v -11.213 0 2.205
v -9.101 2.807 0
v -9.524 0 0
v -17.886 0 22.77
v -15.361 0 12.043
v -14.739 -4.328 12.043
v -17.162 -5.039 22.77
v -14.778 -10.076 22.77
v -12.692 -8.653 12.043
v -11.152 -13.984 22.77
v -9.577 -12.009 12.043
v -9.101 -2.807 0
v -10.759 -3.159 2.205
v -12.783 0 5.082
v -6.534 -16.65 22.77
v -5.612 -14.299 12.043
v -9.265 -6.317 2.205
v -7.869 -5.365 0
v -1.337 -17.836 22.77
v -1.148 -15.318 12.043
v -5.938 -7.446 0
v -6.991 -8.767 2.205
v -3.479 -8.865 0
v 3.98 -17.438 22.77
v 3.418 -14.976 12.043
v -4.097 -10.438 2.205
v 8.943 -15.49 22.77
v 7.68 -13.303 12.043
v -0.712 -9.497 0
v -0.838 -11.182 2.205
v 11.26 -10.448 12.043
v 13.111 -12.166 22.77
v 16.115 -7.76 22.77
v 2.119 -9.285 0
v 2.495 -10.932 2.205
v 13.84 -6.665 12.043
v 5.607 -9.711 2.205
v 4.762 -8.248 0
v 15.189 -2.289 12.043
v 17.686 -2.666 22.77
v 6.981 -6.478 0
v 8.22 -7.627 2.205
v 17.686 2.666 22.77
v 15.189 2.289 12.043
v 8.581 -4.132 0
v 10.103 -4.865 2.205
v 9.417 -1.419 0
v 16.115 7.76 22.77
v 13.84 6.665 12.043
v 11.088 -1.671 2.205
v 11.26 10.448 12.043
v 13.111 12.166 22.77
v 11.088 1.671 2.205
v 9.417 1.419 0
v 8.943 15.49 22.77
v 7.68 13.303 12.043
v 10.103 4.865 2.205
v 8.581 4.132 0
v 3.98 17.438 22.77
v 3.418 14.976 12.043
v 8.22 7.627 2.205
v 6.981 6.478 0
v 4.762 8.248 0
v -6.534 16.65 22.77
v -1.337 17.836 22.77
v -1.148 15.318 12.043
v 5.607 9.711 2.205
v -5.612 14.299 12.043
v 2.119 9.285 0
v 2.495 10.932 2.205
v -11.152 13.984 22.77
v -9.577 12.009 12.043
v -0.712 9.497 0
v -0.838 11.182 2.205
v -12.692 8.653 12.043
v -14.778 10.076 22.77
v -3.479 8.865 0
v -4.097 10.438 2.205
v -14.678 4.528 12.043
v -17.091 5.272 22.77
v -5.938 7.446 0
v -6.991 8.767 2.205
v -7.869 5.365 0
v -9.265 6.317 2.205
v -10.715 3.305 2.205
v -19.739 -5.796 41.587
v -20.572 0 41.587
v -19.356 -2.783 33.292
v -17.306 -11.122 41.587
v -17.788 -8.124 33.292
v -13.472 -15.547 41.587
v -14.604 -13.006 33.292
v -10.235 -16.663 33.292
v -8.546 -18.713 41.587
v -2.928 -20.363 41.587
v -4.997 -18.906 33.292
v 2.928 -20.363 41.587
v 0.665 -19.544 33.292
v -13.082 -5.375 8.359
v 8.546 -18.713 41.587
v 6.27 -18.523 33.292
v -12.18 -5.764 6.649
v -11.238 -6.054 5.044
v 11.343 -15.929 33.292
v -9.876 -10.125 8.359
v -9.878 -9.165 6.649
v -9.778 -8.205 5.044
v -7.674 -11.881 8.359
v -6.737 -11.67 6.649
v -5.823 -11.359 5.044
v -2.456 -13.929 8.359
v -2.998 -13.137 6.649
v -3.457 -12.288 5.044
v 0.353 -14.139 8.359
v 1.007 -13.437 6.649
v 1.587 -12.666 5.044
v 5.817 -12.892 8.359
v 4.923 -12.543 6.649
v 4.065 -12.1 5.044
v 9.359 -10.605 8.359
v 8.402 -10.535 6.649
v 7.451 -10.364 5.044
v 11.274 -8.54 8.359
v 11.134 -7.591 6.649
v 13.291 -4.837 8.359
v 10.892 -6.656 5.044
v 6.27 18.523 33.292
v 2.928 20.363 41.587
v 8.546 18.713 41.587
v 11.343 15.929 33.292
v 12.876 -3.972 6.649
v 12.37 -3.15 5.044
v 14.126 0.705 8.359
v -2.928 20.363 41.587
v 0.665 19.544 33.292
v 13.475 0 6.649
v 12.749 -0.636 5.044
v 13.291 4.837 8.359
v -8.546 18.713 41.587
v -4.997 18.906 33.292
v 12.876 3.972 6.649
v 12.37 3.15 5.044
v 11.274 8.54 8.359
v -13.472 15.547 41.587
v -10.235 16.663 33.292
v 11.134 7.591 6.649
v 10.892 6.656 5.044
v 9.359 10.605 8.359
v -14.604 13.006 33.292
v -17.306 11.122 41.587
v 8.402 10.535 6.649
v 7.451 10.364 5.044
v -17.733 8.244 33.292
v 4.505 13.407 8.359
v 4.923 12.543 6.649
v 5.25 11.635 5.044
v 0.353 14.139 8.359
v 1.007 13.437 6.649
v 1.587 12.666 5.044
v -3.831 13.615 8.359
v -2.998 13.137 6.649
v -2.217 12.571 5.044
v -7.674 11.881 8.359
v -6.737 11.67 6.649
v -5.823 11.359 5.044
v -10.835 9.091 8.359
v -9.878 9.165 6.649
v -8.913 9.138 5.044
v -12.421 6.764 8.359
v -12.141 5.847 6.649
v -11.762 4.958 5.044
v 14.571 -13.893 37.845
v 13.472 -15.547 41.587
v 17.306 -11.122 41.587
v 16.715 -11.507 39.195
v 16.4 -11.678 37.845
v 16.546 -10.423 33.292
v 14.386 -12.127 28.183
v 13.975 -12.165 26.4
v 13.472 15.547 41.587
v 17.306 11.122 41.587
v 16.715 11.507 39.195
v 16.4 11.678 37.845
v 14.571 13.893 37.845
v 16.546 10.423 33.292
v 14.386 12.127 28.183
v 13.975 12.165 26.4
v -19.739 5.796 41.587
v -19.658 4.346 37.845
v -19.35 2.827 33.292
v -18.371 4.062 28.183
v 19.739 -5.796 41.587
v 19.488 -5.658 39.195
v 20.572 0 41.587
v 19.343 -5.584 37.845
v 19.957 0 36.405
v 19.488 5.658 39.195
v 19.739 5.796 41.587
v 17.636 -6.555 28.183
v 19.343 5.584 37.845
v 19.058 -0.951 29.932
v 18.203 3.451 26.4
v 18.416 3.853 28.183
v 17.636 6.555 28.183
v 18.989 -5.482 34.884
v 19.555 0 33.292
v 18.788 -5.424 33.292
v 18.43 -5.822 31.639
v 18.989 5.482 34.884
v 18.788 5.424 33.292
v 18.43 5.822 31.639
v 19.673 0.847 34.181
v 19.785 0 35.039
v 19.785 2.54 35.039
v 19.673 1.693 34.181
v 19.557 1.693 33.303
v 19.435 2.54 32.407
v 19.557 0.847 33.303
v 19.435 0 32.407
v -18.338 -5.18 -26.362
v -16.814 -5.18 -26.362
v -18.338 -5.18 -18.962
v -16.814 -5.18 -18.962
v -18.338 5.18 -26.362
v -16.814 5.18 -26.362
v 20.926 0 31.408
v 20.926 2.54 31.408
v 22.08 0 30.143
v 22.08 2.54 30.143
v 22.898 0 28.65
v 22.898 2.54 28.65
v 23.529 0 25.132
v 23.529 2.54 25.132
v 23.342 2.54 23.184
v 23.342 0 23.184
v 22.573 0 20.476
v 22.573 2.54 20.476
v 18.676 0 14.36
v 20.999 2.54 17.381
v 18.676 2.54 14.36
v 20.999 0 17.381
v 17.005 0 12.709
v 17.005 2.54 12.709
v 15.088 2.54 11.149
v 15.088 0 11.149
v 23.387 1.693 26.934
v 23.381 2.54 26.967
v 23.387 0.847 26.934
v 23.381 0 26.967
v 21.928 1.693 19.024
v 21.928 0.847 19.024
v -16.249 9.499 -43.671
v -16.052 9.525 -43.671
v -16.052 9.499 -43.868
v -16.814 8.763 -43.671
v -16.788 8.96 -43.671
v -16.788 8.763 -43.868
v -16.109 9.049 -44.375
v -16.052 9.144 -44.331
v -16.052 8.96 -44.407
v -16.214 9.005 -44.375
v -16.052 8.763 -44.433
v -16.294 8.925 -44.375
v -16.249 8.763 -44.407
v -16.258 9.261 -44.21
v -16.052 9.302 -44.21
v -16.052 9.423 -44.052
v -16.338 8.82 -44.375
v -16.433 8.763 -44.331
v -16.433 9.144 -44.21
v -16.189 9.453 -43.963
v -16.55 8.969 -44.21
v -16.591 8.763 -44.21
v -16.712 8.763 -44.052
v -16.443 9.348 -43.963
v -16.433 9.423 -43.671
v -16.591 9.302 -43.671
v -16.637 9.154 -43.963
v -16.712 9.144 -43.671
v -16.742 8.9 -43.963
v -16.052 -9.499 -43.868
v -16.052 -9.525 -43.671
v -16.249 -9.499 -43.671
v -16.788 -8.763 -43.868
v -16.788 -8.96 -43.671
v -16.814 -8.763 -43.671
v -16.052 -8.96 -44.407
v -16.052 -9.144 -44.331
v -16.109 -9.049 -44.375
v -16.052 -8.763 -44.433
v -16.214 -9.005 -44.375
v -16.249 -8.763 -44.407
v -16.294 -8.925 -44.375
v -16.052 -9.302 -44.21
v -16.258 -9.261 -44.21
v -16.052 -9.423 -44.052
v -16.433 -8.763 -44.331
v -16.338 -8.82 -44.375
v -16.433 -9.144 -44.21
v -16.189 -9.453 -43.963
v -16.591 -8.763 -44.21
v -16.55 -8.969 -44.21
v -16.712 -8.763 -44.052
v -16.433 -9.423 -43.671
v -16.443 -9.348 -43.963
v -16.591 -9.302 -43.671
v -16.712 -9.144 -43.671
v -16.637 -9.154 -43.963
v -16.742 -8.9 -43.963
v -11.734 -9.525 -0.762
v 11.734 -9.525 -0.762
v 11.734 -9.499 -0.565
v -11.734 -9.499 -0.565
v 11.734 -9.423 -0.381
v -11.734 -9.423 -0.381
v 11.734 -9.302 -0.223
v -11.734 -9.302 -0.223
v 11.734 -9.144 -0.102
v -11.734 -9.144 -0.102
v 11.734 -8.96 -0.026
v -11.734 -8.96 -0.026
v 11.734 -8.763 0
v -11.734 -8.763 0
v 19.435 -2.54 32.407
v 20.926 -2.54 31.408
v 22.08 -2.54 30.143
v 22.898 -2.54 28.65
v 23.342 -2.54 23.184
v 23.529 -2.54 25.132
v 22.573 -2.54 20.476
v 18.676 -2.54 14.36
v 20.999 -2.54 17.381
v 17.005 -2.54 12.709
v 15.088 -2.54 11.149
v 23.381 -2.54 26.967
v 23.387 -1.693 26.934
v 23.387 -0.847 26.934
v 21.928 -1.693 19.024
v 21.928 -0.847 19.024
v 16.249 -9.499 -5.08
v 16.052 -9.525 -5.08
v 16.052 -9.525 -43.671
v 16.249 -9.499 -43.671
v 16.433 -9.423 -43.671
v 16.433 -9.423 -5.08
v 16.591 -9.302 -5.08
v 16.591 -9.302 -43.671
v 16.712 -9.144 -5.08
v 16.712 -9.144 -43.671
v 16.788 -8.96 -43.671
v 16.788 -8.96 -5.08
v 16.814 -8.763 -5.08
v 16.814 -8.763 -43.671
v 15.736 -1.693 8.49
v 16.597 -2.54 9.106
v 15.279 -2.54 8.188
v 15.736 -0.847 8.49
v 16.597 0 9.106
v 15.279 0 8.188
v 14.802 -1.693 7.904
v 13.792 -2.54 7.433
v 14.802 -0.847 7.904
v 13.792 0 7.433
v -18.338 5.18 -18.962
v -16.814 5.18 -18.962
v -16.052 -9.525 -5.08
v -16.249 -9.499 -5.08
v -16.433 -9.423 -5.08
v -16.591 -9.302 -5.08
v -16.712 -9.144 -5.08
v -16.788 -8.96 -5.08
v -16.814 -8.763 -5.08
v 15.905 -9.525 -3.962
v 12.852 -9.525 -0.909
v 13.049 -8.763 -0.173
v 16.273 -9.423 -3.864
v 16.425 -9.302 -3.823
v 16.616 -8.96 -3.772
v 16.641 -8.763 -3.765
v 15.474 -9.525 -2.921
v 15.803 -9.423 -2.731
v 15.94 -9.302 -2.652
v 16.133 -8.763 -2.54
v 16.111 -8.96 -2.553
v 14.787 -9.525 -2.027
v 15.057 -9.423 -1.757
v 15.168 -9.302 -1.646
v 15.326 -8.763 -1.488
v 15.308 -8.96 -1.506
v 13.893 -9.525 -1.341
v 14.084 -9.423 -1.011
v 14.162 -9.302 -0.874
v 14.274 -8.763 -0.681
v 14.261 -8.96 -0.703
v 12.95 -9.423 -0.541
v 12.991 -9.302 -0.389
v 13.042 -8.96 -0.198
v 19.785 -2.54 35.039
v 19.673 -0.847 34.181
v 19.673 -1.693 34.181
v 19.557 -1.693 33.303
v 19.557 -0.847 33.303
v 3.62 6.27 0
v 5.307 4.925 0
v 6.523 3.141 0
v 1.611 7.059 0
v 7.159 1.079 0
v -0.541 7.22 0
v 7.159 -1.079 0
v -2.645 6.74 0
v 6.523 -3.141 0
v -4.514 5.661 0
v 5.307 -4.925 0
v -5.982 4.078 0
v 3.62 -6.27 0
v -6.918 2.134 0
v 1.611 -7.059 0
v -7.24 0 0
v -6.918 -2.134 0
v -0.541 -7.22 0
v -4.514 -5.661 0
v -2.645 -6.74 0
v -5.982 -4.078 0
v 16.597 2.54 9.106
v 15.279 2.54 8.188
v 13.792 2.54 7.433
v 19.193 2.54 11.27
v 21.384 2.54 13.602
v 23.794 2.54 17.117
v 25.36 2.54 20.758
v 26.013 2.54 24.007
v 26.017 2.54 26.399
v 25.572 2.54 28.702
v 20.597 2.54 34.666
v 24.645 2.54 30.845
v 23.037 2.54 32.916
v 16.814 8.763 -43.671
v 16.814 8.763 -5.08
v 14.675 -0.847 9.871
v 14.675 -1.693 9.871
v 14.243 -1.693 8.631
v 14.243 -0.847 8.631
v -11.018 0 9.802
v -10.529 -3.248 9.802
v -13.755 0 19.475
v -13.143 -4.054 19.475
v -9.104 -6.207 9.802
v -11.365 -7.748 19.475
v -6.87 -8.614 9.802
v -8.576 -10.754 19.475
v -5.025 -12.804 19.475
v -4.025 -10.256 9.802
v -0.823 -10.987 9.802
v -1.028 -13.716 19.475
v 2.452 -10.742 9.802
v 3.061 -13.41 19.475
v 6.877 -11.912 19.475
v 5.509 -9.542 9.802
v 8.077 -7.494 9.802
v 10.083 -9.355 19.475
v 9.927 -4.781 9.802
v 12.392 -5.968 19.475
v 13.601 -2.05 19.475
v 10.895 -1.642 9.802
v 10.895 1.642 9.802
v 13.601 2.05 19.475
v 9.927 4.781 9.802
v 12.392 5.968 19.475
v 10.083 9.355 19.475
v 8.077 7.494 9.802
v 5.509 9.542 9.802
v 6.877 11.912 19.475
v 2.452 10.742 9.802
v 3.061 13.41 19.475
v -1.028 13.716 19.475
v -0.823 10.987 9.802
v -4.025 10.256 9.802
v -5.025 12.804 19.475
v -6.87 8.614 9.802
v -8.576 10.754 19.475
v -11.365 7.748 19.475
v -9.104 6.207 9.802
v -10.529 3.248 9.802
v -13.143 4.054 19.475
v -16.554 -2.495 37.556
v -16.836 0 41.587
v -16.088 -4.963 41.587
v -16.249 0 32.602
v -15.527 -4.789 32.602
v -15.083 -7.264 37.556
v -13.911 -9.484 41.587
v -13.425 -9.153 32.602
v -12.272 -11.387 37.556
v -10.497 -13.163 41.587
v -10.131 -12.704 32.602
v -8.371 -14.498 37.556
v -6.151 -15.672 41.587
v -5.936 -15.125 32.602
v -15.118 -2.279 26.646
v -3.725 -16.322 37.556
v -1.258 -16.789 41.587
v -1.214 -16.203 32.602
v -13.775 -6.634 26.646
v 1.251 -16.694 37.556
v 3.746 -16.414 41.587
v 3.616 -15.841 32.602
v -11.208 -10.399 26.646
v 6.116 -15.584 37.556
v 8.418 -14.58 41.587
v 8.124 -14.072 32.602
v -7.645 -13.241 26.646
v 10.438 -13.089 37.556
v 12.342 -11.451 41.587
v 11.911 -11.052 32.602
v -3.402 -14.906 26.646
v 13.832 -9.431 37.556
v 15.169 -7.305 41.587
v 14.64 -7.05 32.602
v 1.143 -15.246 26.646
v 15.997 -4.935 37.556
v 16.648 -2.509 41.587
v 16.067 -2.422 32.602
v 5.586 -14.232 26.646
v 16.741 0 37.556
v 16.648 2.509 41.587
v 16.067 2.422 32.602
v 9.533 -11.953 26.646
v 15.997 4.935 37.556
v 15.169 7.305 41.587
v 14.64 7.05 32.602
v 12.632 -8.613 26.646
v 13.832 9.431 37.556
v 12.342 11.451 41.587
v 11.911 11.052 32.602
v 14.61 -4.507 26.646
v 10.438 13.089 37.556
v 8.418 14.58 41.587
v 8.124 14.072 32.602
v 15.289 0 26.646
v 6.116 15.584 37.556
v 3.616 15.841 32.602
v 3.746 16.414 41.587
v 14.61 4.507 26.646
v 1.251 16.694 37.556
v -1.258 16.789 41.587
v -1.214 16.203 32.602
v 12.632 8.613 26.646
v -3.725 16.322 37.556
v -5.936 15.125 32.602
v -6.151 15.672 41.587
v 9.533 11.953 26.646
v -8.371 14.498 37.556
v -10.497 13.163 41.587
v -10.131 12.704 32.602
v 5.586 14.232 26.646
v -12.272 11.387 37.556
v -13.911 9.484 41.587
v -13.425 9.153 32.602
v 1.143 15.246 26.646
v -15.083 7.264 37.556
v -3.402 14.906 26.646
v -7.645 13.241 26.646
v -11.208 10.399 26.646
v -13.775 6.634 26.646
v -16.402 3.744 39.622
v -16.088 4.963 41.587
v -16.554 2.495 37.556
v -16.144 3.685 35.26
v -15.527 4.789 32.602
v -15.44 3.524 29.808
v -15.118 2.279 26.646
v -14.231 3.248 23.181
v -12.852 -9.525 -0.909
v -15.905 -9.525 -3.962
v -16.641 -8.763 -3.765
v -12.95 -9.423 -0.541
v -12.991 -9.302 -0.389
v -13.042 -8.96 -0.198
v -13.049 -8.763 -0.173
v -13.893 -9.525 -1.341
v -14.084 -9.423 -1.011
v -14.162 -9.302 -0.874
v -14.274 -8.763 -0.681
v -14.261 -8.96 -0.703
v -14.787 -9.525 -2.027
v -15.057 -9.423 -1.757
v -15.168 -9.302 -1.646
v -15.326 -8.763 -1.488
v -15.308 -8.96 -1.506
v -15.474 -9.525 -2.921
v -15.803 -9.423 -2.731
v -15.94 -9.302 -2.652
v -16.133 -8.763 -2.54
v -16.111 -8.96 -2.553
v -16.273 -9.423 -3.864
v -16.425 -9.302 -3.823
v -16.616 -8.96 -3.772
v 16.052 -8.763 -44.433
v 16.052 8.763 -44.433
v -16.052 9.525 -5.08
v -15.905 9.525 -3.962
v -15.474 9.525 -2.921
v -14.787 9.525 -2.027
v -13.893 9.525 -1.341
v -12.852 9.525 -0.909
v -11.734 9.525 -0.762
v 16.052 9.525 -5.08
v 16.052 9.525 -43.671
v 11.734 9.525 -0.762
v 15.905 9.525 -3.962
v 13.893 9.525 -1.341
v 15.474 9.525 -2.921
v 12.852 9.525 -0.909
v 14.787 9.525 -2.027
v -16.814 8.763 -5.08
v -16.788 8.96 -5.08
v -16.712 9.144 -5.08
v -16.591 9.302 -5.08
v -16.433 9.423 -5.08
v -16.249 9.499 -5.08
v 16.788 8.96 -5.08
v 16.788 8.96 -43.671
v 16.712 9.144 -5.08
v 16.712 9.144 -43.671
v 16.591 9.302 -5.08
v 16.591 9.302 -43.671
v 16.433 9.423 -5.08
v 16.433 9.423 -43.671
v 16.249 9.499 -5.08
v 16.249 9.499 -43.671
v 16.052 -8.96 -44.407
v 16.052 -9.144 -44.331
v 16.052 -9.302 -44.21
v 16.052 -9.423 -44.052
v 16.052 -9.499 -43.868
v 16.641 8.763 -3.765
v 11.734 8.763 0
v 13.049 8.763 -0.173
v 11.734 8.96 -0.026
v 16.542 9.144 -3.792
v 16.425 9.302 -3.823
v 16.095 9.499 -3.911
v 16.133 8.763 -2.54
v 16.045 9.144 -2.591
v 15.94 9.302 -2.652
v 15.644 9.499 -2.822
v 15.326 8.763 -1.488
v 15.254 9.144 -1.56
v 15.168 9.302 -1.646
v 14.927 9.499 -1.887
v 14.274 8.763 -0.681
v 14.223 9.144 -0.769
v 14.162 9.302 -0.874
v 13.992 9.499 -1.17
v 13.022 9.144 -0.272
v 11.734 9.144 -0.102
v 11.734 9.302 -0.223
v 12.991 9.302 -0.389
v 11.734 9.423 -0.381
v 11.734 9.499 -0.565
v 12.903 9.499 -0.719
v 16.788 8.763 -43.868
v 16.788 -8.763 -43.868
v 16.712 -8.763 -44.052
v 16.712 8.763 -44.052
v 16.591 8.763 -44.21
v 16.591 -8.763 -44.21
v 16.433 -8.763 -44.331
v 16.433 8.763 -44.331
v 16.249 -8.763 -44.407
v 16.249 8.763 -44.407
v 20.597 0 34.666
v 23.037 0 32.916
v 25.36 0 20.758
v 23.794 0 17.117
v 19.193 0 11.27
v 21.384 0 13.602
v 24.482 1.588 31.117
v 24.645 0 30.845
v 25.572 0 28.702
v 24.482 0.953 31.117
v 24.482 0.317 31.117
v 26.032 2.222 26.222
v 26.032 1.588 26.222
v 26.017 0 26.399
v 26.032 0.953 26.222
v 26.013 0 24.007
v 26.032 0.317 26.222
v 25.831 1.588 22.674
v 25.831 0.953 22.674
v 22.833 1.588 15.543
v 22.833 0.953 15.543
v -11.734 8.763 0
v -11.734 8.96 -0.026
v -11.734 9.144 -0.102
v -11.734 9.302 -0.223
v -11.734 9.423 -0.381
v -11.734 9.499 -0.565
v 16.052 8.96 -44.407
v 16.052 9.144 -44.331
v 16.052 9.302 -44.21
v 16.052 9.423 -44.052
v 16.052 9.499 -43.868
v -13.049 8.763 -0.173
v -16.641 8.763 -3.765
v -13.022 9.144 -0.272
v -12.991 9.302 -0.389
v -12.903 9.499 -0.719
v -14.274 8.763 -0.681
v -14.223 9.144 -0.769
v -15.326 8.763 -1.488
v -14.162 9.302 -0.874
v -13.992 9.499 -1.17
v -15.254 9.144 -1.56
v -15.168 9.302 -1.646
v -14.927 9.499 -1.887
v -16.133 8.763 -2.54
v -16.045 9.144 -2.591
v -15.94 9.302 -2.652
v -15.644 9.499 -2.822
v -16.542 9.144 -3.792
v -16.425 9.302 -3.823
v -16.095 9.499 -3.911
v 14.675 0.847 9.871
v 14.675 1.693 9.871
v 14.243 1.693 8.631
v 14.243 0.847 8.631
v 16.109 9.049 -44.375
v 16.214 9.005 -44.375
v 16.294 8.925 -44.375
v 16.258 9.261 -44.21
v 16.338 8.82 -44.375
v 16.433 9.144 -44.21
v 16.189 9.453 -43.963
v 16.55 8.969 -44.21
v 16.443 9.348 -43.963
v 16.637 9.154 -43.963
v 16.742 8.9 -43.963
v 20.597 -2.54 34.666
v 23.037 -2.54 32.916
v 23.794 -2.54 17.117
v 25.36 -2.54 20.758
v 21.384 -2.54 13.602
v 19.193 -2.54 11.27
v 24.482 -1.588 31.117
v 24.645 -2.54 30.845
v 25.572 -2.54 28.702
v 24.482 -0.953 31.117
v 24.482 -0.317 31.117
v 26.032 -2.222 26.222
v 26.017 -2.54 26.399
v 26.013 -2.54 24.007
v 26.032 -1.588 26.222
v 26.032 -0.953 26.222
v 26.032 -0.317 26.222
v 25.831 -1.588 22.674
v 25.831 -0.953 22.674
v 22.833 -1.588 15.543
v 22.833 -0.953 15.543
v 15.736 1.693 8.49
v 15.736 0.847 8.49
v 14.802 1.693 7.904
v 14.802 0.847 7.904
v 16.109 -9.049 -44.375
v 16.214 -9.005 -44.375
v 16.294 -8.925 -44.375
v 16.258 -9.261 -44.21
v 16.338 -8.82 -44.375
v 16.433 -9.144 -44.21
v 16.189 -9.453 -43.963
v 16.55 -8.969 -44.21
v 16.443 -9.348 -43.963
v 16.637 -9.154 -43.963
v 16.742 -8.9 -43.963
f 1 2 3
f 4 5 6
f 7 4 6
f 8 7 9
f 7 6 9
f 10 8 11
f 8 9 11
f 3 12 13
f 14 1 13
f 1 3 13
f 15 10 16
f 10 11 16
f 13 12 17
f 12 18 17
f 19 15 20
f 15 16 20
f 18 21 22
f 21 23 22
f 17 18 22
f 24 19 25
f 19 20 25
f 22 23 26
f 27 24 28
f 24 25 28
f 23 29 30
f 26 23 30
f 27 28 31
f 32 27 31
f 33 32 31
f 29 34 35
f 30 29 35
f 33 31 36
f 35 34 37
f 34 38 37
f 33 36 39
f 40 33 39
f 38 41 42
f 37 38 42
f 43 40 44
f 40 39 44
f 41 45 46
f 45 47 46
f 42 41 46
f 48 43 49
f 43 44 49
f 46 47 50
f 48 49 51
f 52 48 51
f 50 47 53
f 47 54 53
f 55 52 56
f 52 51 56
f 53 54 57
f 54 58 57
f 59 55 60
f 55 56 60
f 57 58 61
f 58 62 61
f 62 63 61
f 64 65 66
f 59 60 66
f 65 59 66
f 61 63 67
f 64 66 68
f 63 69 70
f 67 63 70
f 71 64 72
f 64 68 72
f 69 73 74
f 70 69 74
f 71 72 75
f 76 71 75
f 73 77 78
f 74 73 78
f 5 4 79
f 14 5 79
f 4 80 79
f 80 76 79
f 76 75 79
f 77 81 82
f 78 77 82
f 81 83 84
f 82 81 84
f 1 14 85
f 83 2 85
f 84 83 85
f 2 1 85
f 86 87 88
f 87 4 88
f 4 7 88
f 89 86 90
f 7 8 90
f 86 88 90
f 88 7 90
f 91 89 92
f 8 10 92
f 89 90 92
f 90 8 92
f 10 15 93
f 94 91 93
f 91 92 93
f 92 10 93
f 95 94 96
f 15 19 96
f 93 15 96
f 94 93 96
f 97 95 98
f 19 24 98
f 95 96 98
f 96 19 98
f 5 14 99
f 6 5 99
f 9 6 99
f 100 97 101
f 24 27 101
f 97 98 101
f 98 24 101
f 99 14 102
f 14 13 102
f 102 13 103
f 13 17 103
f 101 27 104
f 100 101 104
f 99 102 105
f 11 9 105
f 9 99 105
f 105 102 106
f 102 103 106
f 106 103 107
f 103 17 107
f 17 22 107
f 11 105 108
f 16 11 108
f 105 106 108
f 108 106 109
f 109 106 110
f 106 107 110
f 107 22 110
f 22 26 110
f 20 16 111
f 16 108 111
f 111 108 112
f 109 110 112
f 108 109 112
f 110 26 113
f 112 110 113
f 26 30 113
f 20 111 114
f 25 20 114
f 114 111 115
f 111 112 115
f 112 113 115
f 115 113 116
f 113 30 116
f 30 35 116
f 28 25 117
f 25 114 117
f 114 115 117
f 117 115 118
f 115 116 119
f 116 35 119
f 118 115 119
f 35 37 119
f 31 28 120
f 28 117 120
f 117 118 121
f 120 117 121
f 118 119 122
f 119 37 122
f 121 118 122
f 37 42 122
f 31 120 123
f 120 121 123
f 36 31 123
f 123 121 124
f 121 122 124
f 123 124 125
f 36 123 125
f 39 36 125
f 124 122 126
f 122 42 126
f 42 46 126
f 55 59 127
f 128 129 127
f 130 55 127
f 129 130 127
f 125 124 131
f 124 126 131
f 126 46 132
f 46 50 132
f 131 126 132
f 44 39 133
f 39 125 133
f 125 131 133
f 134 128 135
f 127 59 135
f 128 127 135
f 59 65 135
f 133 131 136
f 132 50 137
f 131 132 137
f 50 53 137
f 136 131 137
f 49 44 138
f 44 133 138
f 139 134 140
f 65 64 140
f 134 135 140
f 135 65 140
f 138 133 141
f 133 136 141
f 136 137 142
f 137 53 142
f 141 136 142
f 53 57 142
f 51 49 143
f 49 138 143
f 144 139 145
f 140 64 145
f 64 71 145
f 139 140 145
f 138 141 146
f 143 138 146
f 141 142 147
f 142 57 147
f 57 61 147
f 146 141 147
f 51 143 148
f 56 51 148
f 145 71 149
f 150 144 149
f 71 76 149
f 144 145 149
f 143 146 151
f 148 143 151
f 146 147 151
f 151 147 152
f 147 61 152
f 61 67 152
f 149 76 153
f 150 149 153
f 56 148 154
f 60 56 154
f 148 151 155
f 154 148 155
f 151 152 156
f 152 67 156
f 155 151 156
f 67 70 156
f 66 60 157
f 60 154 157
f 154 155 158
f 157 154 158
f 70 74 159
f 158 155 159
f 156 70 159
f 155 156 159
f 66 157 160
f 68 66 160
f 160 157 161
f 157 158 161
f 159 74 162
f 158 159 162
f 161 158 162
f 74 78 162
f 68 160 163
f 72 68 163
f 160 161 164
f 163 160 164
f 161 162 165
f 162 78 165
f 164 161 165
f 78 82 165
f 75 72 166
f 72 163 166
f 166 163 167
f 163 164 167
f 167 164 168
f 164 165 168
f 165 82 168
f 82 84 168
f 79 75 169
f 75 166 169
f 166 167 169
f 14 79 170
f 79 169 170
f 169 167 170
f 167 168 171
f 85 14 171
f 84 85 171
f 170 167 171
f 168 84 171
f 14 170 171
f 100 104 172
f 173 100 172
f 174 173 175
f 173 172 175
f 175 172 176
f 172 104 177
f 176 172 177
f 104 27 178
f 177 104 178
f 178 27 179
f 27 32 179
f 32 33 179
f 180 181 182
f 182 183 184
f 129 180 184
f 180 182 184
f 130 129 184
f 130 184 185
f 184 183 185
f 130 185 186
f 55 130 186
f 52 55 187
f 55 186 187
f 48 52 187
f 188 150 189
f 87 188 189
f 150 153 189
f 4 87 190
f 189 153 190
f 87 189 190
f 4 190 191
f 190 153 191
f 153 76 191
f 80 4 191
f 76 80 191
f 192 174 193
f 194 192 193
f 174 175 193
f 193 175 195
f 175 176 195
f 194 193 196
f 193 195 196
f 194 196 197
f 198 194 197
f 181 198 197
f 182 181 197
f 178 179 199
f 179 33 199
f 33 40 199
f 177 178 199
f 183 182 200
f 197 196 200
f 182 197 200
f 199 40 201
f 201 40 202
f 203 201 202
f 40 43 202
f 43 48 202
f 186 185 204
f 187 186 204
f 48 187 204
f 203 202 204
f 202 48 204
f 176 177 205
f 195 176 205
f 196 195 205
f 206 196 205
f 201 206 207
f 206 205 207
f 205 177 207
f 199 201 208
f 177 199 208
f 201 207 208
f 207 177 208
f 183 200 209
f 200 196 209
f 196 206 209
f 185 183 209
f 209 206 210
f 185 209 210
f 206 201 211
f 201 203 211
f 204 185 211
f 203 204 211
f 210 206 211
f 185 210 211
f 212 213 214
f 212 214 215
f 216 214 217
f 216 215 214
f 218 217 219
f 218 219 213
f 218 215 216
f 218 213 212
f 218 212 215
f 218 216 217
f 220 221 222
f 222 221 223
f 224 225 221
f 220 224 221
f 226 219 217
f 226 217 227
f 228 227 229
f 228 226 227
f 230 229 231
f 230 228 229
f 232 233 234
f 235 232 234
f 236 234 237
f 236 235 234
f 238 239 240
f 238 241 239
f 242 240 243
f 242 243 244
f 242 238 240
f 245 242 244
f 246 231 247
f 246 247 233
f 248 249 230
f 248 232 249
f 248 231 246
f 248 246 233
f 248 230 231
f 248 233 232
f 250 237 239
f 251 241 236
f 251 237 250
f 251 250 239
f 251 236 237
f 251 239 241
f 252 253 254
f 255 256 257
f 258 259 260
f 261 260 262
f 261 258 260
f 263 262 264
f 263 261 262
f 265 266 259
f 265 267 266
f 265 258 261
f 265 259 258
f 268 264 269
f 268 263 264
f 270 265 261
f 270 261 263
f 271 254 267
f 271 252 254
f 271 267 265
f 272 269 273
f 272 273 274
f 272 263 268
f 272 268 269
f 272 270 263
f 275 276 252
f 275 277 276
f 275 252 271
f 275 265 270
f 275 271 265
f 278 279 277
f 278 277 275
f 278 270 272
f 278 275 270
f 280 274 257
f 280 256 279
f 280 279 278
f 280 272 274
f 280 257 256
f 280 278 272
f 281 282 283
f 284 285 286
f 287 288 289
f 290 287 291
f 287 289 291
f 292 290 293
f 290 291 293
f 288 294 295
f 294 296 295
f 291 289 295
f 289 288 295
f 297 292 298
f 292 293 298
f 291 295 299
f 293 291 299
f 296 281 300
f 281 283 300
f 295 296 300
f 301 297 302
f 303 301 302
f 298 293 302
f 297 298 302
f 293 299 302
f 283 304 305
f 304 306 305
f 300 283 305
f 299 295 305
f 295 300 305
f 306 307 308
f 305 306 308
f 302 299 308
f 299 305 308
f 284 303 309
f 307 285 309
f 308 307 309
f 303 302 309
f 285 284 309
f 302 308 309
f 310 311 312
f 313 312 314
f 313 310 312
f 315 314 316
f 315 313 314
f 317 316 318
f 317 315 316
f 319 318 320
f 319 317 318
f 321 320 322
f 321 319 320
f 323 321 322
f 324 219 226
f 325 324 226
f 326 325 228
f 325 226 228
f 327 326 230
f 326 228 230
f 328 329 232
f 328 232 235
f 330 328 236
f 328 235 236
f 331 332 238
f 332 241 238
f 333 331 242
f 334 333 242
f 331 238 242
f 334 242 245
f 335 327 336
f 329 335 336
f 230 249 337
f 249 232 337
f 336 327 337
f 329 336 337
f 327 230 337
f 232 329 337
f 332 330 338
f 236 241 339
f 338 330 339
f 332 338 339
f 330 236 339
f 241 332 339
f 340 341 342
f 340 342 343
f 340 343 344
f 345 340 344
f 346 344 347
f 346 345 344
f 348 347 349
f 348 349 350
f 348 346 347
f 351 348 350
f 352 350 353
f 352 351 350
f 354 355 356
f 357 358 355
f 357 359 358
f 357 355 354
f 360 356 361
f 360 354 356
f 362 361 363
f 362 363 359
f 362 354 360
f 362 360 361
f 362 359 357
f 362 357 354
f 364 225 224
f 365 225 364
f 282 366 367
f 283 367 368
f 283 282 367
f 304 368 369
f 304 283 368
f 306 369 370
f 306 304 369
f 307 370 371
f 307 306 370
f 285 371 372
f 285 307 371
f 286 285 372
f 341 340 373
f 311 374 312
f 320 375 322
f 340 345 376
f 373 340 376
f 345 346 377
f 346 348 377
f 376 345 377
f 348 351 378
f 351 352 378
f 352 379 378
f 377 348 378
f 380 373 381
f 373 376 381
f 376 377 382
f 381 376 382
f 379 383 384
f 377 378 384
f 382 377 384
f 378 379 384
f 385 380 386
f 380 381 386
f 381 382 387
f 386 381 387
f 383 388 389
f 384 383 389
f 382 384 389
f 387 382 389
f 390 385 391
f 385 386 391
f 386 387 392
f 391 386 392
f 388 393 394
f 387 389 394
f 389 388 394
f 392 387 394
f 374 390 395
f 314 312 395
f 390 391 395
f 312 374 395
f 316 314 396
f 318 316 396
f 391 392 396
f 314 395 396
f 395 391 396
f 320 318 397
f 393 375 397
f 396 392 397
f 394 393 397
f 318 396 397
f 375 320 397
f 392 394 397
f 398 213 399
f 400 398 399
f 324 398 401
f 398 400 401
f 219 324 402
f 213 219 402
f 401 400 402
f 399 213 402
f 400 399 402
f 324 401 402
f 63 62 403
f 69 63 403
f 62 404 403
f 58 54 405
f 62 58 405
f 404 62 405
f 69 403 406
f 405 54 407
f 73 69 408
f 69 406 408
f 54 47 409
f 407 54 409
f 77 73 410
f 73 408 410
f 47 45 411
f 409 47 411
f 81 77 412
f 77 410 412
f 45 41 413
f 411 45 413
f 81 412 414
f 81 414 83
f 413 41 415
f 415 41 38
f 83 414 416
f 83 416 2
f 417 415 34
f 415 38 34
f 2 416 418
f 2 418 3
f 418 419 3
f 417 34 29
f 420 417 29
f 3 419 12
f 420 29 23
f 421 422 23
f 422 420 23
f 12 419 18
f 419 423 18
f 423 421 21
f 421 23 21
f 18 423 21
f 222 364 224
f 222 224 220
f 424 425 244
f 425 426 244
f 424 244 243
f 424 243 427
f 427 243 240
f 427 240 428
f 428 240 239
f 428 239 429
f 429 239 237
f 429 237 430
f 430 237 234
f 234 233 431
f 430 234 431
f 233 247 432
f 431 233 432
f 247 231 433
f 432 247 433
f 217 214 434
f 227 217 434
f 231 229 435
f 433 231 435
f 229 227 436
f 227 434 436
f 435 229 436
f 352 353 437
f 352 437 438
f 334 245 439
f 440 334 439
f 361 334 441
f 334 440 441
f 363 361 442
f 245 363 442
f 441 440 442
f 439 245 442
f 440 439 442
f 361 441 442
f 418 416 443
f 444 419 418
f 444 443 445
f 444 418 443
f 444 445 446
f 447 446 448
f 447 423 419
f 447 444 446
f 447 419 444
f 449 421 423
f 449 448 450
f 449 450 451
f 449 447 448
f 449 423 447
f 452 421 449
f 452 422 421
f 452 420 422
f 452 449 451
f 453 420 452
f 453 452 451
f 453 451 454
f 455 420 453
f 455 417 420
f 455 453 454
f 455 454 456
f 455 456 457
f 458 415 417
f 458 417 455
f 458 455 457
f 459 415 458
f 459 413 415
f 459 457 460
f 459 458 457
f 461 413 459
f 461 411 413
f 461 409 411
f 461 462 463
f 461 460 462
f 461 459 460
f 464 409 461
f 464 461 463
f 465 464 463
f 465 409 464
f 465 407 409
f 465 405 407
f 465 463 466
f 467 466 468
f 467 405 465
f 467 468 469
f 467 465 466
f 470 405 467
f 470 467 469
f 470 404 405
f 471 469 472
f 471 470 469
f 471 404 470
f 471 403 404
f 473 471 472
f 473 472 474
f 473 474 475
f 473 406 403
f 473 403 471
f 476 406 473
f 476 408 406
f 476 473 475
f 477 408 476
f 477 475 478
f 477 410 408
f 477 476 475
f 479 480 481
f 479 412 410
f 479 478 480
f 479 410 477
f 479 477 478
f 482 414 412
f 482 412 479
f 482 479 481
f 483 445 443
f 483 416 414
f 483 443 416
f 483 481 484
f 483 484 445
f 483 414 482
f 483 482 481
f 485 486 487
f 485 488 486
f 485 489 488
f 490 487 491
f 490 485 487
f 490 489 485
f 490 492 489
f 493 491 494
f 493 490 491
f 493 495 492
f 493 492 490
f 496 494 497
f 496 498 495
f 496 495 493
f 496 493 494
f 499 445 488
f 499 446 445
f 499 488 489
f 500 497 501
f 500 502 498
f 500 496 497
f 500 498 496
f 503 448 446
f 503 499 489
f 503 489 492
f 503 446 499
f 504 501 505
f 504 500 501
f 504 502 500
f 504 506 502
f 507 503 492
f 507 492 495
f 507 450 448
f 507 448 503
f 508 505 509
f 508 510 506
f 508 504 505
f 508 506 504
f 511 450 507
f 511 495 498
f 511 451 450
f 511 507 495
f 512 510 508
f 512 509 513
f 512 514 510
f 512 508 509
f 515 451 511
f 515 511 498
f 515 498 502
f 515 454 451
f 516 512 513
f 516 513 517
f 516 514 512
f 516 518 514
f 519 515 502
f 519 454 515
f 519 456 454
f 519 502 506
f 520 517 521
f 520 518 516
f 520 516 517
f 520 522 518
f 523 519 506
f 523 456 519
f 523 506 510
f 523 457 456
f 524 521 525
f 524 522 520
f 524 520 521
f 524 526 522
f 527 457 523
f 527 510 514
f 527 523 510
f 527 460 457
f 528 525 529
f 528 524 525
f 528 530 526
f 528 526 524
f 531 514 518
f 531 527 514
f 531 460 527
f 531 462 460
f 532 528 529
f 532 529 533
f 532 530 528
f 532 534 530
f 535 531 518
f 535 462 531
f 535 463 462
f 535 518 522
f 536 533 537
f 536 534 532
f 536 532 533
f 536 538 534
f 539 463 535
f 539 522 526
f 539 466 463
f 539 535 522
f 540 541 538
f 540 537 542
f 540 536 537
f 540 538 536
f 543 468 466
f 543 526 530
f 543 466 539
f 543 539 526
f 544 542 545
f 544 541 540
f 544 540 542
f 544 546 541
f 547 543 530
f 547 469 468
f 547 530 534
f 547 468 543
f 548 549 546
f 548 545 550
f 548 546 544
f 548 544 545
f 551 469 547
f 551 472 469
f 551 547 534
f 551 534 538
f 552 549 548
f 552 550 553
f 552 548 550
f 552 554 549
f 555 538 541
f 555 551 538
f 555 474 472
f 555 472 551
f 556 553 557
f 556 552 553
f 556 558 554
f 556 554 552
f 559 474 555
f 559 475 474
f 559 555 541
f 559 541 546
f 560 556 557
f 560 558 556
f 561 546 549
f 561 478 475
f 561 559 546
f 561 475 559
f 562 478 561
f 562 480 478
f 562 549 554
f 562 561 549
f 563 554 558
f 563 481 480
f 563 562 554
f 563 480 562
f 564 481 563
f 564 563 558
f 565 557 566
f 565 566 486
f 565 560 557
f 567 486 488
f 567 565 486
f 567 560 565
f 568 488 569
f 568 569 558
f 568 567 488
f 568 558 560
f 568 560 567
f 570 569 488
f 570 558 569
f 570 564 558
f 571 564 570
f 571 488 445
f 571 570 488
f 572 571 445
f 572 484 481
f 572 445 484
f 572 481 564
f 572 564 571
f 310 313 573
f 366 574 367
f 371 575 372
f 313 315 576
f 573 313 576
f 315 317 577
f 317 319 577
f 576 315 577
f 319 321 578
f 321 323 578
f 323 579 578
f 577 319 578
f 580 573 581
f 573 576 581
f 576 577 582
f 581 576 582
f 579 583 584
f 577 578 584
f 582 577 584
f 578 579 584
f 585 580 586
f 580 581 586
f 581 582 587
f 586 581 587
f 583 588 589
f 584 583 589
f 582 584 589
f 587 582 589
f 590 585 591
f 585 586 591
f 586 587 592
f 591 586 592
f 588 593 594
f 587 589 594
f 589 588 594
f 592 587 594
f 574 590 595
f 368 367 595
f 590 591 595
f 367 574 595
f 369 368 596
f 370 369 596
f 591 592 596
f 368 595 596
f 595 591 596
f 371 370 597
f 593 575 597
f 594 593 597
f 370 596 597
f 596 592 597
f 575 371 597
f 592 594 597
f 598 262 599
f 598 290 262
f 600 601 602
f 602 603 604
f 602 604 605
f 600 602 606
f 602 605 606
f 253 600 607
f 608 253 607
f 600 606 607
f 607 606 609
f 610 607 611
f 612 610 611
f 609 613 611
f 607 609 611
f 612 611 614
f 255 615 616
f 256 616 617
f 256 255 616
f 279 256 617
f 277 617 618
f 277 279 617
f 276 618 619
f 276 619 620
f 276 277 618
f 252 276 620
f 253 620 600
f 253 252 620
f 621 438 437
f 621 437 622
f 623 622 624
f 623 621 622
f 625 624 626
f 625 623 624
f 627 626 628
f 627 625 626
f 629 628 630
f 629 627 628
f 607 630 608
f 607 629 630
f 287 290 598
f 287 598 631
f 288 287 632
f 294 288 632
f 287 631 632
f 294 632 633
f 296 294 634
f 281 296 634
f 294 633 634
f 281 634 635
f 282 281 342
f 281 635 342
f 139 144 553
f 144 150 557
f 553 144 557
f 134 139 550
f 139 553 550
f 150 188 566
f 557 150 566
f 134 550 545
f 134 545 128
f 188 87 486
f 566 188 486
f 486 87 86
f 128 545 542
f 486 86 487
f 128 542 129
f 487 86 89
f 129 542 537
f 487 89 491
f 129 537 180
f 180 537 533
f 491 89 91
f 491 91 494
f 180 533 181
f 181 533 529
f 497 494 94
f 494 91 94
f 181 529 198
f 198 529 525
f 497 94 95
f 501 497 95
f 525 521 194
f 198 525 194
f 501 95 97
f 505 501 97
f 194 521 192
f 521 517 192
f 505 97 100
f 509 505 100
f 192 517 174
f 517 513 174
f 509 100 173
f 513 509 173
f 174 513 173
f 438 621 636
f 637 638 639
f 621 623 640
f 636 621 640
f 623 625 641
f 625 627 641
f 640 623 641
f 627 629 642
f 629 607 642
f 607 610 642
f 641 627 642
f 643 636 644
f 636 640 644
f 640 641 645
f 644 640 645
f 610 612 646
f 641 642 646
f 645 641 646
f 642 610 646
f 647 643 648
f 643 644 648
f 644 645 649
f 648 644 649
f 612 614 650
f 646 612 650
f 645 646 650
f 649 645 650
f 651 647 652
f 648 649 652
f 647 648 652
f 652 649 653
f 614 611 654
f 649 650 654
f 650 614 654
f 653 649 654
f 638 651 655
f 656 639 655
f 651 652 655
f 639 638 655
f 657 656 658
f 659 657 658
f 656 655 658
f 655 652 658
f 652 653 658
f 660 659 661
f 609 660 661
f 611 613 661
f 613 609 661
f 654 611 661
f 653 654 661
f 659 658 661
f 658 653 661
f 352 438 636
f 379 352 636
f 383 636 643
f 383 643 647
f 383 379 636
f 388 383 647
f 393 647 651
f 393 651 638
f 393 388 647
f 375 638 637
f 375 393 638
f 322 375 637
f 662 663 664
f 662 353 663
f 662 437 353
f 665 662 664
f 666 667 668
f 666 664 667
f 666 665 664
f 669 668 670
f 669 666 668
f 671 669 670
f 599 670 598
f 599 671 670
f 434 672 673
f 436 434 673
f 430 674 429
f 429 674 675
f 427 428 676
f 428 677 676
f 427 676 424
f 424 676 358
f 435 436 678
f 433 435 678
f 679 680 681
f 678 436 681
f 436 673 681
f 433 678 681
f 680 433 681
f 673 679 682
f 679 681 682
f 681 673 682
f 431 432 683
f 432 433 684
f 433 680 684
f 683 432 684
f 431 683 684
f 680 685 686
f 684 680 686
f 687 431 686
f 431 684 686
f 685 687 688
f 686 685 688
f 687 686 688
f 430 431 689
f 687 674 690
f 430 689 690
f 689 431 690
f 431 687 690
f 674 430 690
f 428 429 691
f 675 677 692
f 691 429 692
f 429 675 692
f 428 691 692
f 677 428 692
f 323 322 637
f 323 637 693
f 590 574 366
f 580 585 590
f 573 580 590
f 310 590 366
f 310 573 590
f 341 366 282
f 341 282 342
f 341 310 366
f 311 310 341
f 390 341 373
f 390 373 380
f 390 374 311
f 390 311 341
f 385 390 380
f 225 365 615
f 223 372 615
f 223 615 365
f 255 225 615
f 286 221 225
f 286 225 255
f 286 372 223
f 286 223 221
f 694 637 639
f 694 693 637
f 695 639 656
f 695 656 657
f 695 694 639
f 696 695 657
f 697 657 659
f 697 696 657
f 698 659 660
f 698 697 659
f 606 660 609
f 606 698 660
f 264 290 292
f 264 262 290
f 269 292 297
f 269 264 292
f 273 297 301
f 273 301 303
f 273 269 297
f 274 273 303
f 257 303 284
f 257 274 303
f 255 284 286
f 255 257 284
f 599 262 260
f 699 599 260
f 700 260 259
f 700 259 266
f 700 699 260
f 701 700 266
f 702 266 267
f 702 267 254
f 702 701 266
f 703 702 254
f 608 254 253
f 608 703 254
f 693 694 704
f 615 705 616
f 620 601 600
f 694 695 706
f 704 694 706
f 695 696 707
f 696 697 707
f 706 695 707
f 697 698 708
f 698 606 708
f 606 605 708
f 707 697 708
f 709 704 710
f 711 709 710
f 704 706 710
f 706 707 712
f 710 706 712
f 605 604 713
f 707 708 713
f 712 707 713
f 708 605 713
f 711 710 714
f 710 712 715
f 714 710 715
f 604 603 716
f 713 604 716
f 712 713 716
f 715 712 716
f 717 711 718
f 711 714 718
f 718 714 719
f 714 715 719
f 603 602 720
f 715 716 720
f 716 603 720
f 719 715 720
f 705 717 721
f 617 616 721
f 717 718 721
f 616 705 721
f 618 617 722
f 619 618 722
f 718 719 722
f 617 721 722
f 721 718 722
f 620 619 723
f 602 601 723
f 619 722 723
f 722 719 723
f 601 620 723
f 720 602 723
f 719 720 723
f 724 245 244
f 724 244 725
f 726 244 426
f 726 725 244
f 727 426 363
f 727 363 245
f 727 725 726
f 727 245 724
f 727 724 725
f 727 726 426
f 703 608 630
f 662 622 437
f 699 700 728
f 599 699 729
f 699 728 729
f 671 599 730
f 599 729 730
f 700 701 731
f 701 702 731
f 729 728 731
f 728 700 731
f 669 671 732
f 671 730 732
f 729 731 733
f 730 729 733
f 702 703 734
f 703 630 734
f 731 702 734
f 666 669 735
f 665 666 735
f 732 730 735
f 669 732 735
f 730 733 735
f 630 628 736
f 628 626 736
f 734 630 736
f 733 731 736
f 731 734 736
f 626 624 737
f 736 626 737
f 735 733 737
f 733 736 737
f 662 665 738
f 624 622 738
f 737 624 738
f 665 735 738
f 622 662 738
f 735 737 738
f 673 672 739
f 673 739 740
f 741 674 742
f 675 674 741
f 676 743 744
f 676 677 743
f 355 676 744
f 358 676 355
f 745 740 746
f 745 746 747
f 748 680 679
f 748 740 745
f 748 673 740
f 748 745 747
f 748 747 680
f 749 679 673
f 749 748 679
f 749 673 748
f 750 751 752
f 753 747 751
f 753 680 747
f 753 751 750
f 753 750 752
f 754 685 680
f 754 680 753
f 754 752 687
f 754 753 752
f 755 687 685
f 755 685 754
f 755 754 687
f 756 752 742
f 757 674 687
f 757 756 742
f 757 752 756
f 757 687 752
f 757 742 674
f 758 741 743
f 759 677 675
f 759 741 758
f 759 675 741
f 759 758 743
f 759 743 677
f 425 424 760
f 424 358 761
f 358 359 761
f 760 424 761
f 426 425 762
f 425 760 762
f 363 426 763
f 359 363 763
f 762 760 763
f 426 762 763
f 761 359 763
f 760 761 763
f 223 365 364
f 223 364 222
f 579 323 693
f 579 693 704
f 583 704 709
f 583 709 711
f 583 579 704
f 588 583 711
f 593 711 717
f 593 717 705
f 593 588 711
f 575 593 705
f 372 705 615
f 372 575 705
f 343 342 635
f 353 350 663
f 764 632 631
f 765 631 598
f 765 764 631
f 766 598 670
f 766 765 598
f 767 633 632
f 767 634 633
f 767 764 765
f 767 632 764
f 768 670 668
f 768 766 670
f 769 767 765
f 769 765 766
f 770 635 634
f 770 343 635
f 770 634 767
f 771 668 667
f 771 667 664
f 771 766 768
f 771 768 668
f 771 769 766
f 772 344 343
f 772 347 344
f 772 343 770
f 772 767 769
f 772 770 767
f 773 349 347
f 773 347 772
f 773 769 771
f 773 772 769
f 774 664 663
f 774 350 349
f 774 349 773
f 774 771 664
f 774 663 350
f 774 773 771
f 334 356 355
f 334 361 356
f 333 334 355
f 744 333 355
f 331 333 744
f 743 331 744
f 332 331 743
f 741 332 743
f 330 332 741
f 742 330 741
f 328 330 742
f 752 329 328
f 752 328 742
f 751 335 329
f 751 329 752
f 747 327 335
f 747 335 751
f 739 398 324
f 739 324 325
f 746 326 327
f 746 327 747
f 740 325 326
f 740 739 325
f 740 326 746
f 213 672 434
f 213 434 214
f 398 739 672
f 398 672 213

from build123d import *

# Parameters (mm, degrees)
F1_DEPTH = 9.525
F2_R     = 0.762
F4_DEPTH = 2.54
F5_W     = 10.3596793488
F5_H     = 7.399763912
F6_DEPTH = 1.524


# Not quite as in the source:
# - the dataset's text gives a spline's control points without its knots; the knots are read off the source's solid


with BuildPart() as f1:
    # F0 (on Front) → F1 (new body, symmetric)
    with BuildSketch(Plane.XZ):
        with BuildLine():
            ThreePointArc((16.8140027672, -5.08), (15.3261052156, -1.4878975516), (11.7340027672, 0))
            Line((11.7340027672, 0), (9.5236673951, 0))
            Line((9.5236673951, 0), (0, 0))
            Line((0, 0), (-7.2401063517, 0))
            Line((-7.2401063517, 0), (-9.5236673951, 0))
            Line((-9.5236673951, 0), (-11.7340027672, 0))
            ThreePointArc((-11.7340027672, 0), (-15.3261052156, -1.4878975516), (-16.8140027672, -5.08))
            Line((-16.8140027672, -5.08), (-16.8140027672, -44.433273375))
            Line((-16.8140027672, -44.433273375), (16.8140027672, -44.433273375))
            Line((16.8140027672, -44.433273375), (16.8140027672, -5.08))
        make_face()
    extrude(amount=F1_DEPTH, both=True)

    # F2
    f2_edges = [f1.edges().sort_by_distance(p)[0] for p in [
        (0, -9.525, 0),
        (16.814003, -9.525, -24.756637),
        (15.326105, -9.525, -1.487898),
        (15.326105, 9.525, -1.487898),
        (0, 9.525, 0),
        (16.814003, 9.525, -24.756637),
        (-15.326105, 9.525, -1.487898),
        (-16.814003, 9.525, -24.756637),
        (0, 9.525, -44.433273),
        (-15.326105, -9.525, -1.487898),
        (-16.814003, -9.525, -24.756637),
        (0, -9.525, -44.433273),
        (-16.814003, 0, -5.08),
        (-16.814003, 0, -44.433273),
        (16.814003, 0, -5.08),
        (16.814003, 0, -44.433273),
    ]]
    fillet(f2_edges, radius=F2_R)

    # F5 (on face) → F6 (join)
    with BuildSketch(Plane(origin=(-16.8140027672, 0, 0), x_dir=(0, -1, 0), z_dir=(-1, 0, 0))):
        with Locations((0, -22.6617902517)):
            Rectangle(F5_W, F5_H)
    extrude(amount=F6_DEPTH)


with BuildPart() as f3:
    # F0 (on Front) → F3 (revolve)
    with BuildSketch(Plane.XZ):
        with BuildLine():
            Line((-9.5236673951, 0), (-7.2401063517, 0))
            add(Edge.make_bspline(
                [(-16.8360508978, 41.5870919824), (-16.8553277932, 38.8545802624), (-16.5581952608, 31.2683940077), (-12.3689733446, 11.3153951243), (-7.2401063517, 0)],
                knots=[0, 0, 0, 0, 0.348881703, 1, 1, 1, 1], degree=3))
            Line((-16.8360508978, 41.5870919824), (-20.5721743405, 41.5870919824))
            add(Edge.make_bspline(
                [(-20.5721743405, 41.5870919824), (-19.4350704551, 31.8282805383), (-16.7806390673, 7.7172145247), (-9.5236673951, 0)],
                knots=[0, 0, 0, 0, 43.0297074737, 43.0297074737, 43.0297074737, 43.0297074737], degree=3))
        make_face()
    revolve(axis=Axis((0, 0, 20.7935459912), (0, 0, 1)))


with BuildPart() as f4:
    # F0 (on Front) → F4 (new body, symmetric)
    with BuildSketch(Plane.XZ):
        with BuildLine():
            add(Edge.make_bspline(
                [(15.0883483115, 11.1491326454), (14.6839512093, 9.8533166215), (14.2523389086, 8.6080504568), (13.7915127177, 7.4332523839)],
                knots=[29.5353429201, 29.5353429201, 29.5353429201, 29.5353429201, 33.2585908266, 33.2585908266, 33.2585908266, 33.2585908266], degree=3))
            add(Edge.make_bspline(
                [(16.5973321119, 9.1059567131), (15.7718844712, 8.504178375), (14.8418424651, 7.8182732686), (13.7915127177, 7.4332523839)],
                knots=[0, 0, 0, 0, 3.2665826556, 3.2665826556, 3.2665826556, 3.2665826556], degree=3))
            add(Edge.make_bspline(
                [(20.5968842238, 34.6659384297), (21.6884105691, 34.104490474), (23.1260600945, 33.0034985903), (24.526596028, 31.141826143), (25.5668613568, 29.0824519601), (26.1939854164, 26.2505211334), (25.9764658619, 22.6813598881), (24.8851440982, 19.0678312081), (22.3274130345, 14.3300367076), (19.2019247954, 11.0295738153), (16.5973321119, 9.1059567131)],
                knots=[0, 0, 0, 0, 0.125, 0.1875, 0.25, 0.375, 0.5, 0.625, 0.75, 1, 1, 1, 1], degree=3))
            Line((20.5968842238, 34.6659384297), (19.784617424, 35.0388268786))
            add(Edge.make_bspline(
                [(19.784617424, 35.0388268786), (19.6759864871, 34.1916570064), (19.5597008725, 33.3121636908), (19.4350704551, 32.4072244666)],
                knots=[7.8099300685, 7.8099300685, 7.8099300685, 7.8099300685, 10.4219868825, 10.4219868825, 10.4219868825, 10.4219868825], degree=3))
            add(Edge.make_bspline(
                [(19.4350704551, 32.4072244666), (26.1015295982, 28.9782006294), (24.6091987938, 18.1807391346), (15.0883483115, 11.1491326454)],
                knots=[0, 0, 0, 0, 21.6979367976, 21.6979367976, 21.6979367976, 21.6979367976], degree=3))
        make_face()
    extrude(amount=F4_DEPTH, both=True)


solid = Compound([f1.part, f3.part, f4.part])
